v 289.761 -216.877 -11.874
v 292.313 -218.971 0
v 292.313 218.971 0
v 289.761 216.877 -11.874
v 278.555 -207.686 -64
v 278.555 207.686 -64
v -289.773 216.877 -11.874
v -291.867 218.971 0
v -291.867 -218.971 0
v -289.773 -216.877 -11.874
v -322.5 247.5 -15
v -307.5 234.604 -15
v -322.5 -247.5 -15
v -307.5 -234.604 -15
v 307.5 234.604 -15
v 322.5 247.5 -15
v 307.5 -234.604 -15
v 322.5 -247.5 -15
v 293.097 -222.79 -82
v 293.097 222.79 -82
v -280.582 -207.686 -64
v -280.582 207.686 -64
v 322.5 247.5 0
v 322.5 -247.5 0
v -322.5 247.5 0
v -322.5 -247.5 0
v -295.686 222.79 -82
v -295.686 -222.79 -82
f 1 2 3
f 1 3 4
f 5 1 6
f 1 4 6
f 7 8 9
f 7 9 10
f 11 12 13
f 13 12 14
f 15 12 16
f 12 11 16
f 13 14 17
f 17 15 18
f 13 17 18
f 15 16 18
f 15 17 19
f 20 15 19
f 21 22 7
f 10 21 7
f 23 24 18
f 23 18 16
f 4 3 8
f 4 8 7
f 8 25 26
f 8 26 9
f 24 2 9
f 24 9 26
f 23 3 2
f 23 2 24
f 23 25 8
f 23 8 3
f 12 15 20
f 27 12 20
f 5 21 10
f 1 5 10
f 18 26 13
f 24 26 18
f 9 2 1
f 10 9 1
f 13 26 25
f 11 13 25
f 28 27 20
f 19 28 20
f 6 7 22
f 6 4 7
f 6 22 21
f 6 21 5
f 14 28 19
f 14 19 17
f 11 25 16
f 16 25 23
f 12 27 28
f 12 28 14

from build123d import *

# Parameters (mm, degrees)
F0_W          = 645
F0_H          = 495
F1_DEPTH      = 82
F3_DEPTH      = 322.501
F3_DEPTH_BACK = 495
F5_DEPTH      = 365
F5_DEPTH_BACK = 341
F6_T          = 18
F6_T3_DEPTH   = 505.2074342574
F6_T5_DEPTH   = 651


# Not quite as in the source:
# - a shell that OpenCascade refuses in one call is made with other operations: the cavity is built on its own and cut out


with BuildPart() as f1:
    # F0 (on Top) → F1 (new body)
    with BuildSketch(Plane.XY):
        Rectangle(F0_W, F0_H)
    extrude(amount=-F1_DEPTH)

    # F2 (on Right) → F3 (cut, two sides)
    with BuildSketch(Plane.YZ) as f3_sk:
        Polygon((-277.5, -15), (-277.5, -112), (-217.5, -112), (-234.6037171287, -15), align=None)
        Polygon((277.5, -15), (234.6037171287, -15), (217.5, -112), (277.5, -112), align=None)
    extrude(amount=F3_DEPTH, mode=Mode.SUBTRACT)
    extrude(f3_sk.sketch, amount=-F3_DEPTH_BACK, mode=Mode.SUBTRACT)

    # F4 (on Front) → F5 (cut, two sides)
    with BuildSketch(Plane.XZ) as f5_sk:
        Polygon((-337.5, -15), (-337.5, -185.1384545885), (-277.5, -185.1384545885), (-307.5, -15), align=None)
        Polygon((337.5, -15), (307.5, -15), (277.5415446769, -154.3605614963), (337.5, -156.5929672103), align=None)
    extrude(amount=F5_DEPTH, mode=Mode.SUBTRACT)
    extrude(f5_sk.sketch, amount=-F5_DEPTH_BACK, mode=Mode.SUBTRACT)

    # F6: shell of thickness 18, made by hand


with BuildPart() as f6_core1:
    # F6_t2: copy of F1
    add(f1.part)

    # the walls: a layer under each face that stays
    f6_faces = [f6_core1.faces().sort_by_distance(p)[0] for p in [
        (-322.5, 0, -7.5),
        (0, -247.5, -7.5),
        (322.5, 0, -7.5),
        (314.537037037, -170.15625, -15),
        (0, 228.696763275, -48.5),
        (-1.2945688909, 0, -82),
        (300.2984772553, 0, -48.5),
        (0, -228.696763275, -48.5),
        (-301.5930461463, 0, -48.5),
        (0, 247.5, -7.5),
    ]]
    thicken(f6_faces, amount=-F6_T, mode=Mode.SUBTRACT)

    # F6_s4 → F6_t3 (cut)
    with BuildSketch(Plane.XZ.offset(-252.6037171287)):
        Polygon((-307.6772653955, -15.211256672), (-307.5, 3), (-292.3962066388, 3), (-289.7734604458, -11.874332802), align=None)
        Polygon((307.6759796954, -15.2178305009), (307.5, 3), (292.9582599542, 3), (289.902030457, -11.2169499127), align=None)
    extrude(amount=F6_T3_DEPTH, mode=Mode.SUBTRACT)

    # F6_s6 → F6_t5 (cut)
    with BuildSketch(Plane.YZ.offset(-325.5)):
        Polygon((-234.7809825243, -15.211256672), (-234.6037171287, 3), (-219.4999237675, 3), (-216.8771775745, -11.874332802), align=None)
        Polygon((234.7809825243, -15.211256672), (234.6037171287, 3), (219.4999237675, 3), (216.8771775745, -11.874332802), align=None)
    extrude(amount=F6_T5_DEPTH, mode=Mode.SUBTRACT)


with BuildPart() as f1_1:
    add(f1.part)

    # what is left inside the walls is the cavity
    f6_cavity = [f6_core1.part.solids().sort_by_distance(p)[0] for p in [
        (0.223061, -72.990314, -0.18),
    ]]
    add(f6_cavity, mode=Mode.SUBTRACT)


solid = f1_1.part
